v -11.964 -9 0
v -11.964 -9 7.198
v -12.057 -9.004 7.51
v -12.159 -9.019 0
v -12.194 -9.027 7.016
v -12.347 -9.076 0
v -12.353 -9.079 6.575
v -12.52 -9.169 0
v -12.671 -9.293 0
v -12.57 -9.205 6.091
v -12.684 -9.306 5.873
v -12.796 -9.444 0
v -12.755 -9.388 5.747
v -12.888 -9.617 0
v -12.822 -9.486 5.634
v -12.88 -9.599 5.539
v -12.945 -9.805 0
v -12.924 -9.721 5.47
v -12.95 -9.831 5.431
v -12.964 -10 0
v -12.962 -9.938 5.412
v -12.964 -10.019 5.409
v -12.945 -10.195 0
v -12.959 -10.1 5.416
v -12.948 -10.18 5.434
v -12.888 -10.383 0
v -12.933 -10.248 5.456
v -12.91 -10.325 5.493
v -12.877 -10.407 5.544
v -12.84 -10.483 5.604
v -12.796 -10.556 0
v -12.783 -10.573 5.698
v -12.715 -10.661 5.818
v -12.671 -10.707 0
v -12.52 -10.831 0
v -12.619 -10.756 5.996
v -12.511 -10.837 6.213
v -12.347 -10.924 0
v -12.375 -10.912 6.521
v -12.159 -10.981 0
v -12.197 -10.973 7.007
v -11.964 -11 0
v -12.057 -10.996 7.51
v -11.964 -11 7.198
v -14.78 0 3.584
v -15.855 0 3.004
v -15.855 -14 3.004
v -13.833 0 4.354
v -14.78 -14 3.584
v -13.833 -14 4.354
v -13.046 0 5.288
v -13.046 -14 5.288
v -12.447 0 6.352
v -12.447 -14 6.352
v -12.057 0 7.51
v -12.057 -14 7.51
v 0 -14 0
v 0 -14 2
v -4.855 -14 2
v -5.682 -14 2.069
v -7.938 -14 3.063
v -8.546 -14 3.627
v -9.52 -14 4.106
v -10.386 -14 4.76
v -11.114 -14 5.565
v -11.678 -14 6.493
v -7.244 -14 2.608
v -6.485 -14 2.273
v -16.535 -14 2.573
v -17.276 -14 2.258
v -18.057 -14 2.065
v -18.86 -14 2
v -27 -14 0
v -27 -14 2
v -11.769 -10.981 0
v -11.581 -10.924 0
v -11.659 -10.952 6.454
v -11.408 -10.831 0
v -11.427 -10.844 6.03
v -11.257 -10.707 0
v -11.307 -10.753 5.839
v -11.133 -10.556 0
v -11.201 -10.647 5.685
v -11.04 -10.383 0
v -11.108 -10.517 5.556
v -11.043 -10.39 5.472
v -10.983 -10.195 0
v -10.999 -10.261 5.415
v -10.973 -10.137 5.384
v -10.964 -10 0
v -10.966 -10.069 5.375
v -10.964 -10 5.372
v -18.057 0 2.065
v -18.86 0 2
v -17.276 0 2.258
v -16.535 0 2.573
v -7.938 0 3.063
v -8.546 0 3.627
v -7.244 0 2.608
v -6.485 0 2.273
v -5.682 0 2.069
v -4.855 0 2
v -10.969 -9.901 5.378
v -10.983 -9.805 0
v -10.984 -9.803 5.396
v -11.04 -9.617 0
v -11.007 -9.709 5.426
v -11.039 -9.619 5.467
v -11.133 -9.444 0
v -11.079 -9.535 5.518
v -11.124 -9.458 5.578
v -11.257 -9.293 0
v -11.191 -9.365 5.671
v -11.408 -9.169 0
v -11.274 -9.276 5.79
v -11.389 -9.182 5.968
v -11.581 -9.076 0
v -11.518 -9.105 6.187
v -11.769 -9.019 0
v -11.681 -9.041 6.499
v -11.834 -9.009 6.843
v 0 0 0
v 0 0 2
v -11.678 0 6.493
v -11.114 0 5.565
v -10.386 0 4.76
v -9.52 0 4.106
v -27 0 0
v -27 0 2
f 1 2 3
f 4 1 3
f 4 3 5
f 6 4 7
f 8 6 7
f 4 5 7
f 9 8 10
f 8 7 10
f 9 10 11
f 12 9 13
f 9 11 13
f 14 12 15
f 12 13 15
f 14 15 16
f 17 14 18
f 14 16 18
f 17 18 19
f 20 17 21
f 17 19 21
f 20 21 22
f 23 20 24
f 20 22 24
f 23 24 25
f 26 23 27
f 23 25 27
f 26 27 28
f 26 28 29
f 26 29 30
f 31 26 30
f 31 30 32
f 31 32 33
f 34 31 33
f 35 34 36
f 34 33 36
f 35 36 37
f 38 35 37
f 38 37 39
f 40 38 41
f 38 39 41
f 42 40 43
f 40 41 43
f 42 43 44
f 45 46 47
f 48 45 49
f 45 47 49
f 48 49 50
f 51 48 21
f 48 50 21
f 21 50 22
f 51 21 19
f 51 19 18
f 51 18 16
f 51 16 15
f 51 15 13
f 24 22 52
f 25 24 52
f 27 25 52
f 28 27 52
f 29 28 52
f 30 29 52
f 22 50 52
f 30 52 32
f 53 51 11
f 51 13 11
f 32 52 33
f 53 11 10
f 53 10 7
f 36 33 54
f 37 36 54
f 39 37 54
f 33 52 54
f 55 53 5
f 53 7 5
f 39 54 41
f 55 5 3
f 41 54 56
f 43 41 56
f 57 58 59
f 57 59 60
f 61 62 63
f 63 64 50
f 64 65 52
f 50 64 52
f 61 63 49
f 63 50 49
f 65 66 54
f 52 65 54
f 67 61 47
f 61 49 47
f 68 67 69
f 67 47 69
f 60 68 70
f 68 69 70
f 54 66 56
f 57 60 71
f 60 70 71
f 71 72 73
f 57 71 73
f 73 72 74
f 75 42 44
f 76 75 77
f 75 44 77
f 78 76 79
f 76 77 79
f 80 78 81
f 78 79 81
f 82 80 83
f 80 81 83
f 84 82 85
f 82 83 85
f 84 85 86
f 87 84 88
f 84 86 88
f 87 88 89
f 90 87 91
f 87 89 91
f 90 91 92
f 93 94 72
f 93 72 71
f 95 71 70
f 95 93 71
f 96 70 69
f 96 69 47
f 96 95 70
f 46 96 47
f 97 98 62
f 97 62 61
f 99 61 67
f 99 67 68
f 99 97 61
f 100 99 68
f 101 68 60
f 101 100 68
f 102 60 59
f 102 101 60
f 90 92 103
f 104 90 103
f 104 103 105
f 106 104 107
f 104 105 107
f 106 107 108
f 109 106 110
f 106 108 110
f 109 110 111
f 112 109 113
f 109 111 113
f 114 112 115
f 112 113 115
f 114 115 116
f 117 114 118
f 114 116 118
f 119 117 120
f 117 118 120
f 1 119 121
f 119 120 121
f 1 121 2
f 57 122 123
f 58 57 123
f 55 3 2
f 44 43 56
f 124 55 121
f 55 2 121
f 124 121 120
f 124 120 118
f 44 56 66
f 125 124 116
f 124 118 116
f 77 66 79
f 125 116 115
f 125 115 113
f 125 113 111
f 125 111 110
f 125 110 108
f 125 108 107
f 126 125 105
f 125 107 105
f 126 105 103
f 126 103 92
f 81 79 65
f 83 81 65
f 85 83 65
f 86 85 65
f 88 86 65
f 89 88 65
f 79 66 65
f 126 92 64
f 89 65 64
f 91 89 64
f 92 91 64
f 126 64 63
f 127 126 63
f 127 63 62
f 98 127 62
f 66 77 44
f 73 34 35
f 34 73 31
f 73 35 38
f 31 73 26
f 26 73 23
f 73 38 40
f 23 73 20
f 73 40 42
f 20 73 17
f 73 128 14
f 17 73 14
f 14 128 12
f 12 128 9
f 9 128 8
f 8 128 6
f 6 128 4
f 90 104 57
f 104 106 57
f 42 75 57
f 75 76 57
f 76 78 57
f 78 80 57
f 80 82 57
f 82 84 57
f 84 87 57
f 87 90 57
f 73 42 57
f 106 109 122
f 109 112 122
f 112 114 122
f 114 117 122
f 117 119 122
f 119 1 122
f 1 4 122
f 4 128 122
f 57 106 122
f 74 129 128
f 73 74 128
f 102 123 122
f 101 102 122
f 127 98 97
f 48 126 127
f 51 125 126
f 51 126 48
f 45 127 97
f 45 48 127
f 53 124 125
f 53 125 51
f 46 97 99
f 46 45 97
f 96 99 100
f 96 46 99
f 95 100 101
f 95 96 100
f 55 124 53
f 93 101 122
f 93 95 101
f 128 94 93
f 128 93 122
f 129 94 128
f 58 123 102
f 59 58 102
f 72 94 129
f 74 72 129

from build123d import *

# Parameters (mm, degrees)
F1_DEPTH    = 14
F4_DEPTH    = 25
F7_DEPTH    = 25
F8_T1_DEPTH = 14
F9_T1_DEPTH = 14


# Not quite as in the source:
# - a fillet or chamfer that OpenCascade refuses, or shapes differently, is made with other operations: its cross-section is extruded or revolved along the edge and cut away or added


with BuildPart() as f1:
    # F0 (on Front) → F1 (new body)
    with BuildSketch(Plane.XZ):
        Polygon((-16.5, 2), (-27, 2), (-27, 0), (0, 0), (0, 2), (-7.5, 2), (-12, 2), align=None)
        Polygon((-12, 9), (-16.5, 2), (-12, 2), align=None)
        Polygon((-12, 9), (-12, 2), (-7.5, 2), align=None)
    extrude(amount=F1_DEPTH)

    # F3 (on face) → F4 (cut)
    with BuildSketch(Plane.XY.offset(9)):
        with BuildLine():
            ThreePointArc((-10.9640486734, -10), (-11.2569418922, -9.2928932188), (-11.9640486734, -9))
            Line((-11.9640486734, -9), (-11.9640486734, -10))
            Line((-11.9640486734, -10), (-11.9640486734, -11))
            ThreePointArc((-11.9640486734, -11), (-11.2569418922, -10.7071067812), (-10.9640486734, -10))
        make_face()
        with BuildLine():
            Line((-11.9640486734, -10), (-11.9640486734, -9))
            ThreePointArc((-11.9640486734, -9), (-12.9640486734, -10), (-11.9640486734, -11))
            Line((-11.9640486734, -11), (-11.9640486734, -10))
        make_face()
    extrude(amount=-F4_DEPTH, mode=Mode.SUBTRACT)

    # F6 (on offset) → F7 (cut)
    with BuildSketch(Plane.XZ.offset(14)):
        with BuildLine():
            Line((-11.884468704, 9.0000648052), (-12.0001798496, 9.0000648052))
            Line((-12.0001798496, 9.0000648052), (-12.253829136, 9.0000648052))
            ThreePointArc((-12.253829136, 9.0000648052), (-12.2044720661, 8.2484912646), (-12.0572486618, 7.5098274869))
            ThreePointArc((-12.0572486618, 7.5098274869), (-11.9278078867, 8.2499547835), (-11.884468704, 9.0000648052))
        make_face()
        with BuildLine():
            Line((-12.253829136, 9.0000648052), (-12.0001798496, 9.0000648052))
            Line((-12.0001798496, 9.0000648052), (-11.884468704, 9.0000648052))
            ThreePointArc((-11.884468704, 9.0000648052), (-11.9278078867, 9.7501748268), (-12.0572486618, 10.4903021234))
            ThreePointArc((-12.0572486618, 10.4903021234), (-12.2044720661, 9.7516383457), (-12.253829136, 9.0000648052))
        make_face()
        with BuildLine():
            ThreePointArc((-12.0572486618, 7.5098274869), (-12.2044720661, 8.2484912646), (-12.253829136, 9.0000648052))
            ThreePointArc((-12.253829136, 9.0000648052), (-12.2044720661, 9.7516383457), (-12.0572486618, 10.4903021234))
            ThreePointArc((-12.0572486618, 10.4903021234), (-24.9106333558, 9.0000648052), (-12.0572486618, 7.5098274869))
        make_face()
        with BuildLine():
            ThreePointArc((-12.0572486618, 10.4903021234), (-11.9278078867, 9.7501748268), (-11.884468704, 9.0000648052))
            ThreePointArc((-11.884468704, 9.0000648052), (-11.9278078867, 8.2499547835), (-12.0572486618, 7.5098274869))
            ThreePointArc((-12.0572486618, 7.5098274869), (-5.7553696033, 3.3025358829), (-0.7600571518, 9.0000648052))
            ThreePointArc((-0.7600571518, 9.0000648052), (-5.7553696033, 14.6975937274), (-12.0572486618, 10.4903021234))
        make_face()
    extrude(amount=-F7_DEPTH, mode=Mode.SUBTRACT)

    # F8: fillet of radius 5 on 1 edges, made by hand

    # F8_s2 → F8_t1 (join)
    with BuildSketch(Plane.XZ):
        with BuildLine():
            ThreePointArc((-18.8598420152, 2), (-17.2756076516, 2.2576164768), (-15.854623238, 3.0039194075))
            Line((-15.854623238, 3.0039194075), (-16.5, 2))
            Line((-16.5, 2), (-18.8598420152, 2))
        make_face()
    extrude(amount=F8_T1_DEPTH)

    # F9: fillet of radius 5 on 1 edges, made by hand

    # F9_s2 → F9_t1 (join)
    with BuildSketch(Plane.XZ):
        with BuildLine():
            ThreePointArc((-8.5459751266, 3.6270724192), (-6.8718408683, 2.4248148724), (-4.8549915809, 2))
            Line((-4.8549915809, 2), (-7.5, 2))
            Line((-7.5, 2), (-8.5459751266, 3.6270724192))
        make_face()
    extrude(amount=F9_T1_DEPTH)


solid = f1.part
